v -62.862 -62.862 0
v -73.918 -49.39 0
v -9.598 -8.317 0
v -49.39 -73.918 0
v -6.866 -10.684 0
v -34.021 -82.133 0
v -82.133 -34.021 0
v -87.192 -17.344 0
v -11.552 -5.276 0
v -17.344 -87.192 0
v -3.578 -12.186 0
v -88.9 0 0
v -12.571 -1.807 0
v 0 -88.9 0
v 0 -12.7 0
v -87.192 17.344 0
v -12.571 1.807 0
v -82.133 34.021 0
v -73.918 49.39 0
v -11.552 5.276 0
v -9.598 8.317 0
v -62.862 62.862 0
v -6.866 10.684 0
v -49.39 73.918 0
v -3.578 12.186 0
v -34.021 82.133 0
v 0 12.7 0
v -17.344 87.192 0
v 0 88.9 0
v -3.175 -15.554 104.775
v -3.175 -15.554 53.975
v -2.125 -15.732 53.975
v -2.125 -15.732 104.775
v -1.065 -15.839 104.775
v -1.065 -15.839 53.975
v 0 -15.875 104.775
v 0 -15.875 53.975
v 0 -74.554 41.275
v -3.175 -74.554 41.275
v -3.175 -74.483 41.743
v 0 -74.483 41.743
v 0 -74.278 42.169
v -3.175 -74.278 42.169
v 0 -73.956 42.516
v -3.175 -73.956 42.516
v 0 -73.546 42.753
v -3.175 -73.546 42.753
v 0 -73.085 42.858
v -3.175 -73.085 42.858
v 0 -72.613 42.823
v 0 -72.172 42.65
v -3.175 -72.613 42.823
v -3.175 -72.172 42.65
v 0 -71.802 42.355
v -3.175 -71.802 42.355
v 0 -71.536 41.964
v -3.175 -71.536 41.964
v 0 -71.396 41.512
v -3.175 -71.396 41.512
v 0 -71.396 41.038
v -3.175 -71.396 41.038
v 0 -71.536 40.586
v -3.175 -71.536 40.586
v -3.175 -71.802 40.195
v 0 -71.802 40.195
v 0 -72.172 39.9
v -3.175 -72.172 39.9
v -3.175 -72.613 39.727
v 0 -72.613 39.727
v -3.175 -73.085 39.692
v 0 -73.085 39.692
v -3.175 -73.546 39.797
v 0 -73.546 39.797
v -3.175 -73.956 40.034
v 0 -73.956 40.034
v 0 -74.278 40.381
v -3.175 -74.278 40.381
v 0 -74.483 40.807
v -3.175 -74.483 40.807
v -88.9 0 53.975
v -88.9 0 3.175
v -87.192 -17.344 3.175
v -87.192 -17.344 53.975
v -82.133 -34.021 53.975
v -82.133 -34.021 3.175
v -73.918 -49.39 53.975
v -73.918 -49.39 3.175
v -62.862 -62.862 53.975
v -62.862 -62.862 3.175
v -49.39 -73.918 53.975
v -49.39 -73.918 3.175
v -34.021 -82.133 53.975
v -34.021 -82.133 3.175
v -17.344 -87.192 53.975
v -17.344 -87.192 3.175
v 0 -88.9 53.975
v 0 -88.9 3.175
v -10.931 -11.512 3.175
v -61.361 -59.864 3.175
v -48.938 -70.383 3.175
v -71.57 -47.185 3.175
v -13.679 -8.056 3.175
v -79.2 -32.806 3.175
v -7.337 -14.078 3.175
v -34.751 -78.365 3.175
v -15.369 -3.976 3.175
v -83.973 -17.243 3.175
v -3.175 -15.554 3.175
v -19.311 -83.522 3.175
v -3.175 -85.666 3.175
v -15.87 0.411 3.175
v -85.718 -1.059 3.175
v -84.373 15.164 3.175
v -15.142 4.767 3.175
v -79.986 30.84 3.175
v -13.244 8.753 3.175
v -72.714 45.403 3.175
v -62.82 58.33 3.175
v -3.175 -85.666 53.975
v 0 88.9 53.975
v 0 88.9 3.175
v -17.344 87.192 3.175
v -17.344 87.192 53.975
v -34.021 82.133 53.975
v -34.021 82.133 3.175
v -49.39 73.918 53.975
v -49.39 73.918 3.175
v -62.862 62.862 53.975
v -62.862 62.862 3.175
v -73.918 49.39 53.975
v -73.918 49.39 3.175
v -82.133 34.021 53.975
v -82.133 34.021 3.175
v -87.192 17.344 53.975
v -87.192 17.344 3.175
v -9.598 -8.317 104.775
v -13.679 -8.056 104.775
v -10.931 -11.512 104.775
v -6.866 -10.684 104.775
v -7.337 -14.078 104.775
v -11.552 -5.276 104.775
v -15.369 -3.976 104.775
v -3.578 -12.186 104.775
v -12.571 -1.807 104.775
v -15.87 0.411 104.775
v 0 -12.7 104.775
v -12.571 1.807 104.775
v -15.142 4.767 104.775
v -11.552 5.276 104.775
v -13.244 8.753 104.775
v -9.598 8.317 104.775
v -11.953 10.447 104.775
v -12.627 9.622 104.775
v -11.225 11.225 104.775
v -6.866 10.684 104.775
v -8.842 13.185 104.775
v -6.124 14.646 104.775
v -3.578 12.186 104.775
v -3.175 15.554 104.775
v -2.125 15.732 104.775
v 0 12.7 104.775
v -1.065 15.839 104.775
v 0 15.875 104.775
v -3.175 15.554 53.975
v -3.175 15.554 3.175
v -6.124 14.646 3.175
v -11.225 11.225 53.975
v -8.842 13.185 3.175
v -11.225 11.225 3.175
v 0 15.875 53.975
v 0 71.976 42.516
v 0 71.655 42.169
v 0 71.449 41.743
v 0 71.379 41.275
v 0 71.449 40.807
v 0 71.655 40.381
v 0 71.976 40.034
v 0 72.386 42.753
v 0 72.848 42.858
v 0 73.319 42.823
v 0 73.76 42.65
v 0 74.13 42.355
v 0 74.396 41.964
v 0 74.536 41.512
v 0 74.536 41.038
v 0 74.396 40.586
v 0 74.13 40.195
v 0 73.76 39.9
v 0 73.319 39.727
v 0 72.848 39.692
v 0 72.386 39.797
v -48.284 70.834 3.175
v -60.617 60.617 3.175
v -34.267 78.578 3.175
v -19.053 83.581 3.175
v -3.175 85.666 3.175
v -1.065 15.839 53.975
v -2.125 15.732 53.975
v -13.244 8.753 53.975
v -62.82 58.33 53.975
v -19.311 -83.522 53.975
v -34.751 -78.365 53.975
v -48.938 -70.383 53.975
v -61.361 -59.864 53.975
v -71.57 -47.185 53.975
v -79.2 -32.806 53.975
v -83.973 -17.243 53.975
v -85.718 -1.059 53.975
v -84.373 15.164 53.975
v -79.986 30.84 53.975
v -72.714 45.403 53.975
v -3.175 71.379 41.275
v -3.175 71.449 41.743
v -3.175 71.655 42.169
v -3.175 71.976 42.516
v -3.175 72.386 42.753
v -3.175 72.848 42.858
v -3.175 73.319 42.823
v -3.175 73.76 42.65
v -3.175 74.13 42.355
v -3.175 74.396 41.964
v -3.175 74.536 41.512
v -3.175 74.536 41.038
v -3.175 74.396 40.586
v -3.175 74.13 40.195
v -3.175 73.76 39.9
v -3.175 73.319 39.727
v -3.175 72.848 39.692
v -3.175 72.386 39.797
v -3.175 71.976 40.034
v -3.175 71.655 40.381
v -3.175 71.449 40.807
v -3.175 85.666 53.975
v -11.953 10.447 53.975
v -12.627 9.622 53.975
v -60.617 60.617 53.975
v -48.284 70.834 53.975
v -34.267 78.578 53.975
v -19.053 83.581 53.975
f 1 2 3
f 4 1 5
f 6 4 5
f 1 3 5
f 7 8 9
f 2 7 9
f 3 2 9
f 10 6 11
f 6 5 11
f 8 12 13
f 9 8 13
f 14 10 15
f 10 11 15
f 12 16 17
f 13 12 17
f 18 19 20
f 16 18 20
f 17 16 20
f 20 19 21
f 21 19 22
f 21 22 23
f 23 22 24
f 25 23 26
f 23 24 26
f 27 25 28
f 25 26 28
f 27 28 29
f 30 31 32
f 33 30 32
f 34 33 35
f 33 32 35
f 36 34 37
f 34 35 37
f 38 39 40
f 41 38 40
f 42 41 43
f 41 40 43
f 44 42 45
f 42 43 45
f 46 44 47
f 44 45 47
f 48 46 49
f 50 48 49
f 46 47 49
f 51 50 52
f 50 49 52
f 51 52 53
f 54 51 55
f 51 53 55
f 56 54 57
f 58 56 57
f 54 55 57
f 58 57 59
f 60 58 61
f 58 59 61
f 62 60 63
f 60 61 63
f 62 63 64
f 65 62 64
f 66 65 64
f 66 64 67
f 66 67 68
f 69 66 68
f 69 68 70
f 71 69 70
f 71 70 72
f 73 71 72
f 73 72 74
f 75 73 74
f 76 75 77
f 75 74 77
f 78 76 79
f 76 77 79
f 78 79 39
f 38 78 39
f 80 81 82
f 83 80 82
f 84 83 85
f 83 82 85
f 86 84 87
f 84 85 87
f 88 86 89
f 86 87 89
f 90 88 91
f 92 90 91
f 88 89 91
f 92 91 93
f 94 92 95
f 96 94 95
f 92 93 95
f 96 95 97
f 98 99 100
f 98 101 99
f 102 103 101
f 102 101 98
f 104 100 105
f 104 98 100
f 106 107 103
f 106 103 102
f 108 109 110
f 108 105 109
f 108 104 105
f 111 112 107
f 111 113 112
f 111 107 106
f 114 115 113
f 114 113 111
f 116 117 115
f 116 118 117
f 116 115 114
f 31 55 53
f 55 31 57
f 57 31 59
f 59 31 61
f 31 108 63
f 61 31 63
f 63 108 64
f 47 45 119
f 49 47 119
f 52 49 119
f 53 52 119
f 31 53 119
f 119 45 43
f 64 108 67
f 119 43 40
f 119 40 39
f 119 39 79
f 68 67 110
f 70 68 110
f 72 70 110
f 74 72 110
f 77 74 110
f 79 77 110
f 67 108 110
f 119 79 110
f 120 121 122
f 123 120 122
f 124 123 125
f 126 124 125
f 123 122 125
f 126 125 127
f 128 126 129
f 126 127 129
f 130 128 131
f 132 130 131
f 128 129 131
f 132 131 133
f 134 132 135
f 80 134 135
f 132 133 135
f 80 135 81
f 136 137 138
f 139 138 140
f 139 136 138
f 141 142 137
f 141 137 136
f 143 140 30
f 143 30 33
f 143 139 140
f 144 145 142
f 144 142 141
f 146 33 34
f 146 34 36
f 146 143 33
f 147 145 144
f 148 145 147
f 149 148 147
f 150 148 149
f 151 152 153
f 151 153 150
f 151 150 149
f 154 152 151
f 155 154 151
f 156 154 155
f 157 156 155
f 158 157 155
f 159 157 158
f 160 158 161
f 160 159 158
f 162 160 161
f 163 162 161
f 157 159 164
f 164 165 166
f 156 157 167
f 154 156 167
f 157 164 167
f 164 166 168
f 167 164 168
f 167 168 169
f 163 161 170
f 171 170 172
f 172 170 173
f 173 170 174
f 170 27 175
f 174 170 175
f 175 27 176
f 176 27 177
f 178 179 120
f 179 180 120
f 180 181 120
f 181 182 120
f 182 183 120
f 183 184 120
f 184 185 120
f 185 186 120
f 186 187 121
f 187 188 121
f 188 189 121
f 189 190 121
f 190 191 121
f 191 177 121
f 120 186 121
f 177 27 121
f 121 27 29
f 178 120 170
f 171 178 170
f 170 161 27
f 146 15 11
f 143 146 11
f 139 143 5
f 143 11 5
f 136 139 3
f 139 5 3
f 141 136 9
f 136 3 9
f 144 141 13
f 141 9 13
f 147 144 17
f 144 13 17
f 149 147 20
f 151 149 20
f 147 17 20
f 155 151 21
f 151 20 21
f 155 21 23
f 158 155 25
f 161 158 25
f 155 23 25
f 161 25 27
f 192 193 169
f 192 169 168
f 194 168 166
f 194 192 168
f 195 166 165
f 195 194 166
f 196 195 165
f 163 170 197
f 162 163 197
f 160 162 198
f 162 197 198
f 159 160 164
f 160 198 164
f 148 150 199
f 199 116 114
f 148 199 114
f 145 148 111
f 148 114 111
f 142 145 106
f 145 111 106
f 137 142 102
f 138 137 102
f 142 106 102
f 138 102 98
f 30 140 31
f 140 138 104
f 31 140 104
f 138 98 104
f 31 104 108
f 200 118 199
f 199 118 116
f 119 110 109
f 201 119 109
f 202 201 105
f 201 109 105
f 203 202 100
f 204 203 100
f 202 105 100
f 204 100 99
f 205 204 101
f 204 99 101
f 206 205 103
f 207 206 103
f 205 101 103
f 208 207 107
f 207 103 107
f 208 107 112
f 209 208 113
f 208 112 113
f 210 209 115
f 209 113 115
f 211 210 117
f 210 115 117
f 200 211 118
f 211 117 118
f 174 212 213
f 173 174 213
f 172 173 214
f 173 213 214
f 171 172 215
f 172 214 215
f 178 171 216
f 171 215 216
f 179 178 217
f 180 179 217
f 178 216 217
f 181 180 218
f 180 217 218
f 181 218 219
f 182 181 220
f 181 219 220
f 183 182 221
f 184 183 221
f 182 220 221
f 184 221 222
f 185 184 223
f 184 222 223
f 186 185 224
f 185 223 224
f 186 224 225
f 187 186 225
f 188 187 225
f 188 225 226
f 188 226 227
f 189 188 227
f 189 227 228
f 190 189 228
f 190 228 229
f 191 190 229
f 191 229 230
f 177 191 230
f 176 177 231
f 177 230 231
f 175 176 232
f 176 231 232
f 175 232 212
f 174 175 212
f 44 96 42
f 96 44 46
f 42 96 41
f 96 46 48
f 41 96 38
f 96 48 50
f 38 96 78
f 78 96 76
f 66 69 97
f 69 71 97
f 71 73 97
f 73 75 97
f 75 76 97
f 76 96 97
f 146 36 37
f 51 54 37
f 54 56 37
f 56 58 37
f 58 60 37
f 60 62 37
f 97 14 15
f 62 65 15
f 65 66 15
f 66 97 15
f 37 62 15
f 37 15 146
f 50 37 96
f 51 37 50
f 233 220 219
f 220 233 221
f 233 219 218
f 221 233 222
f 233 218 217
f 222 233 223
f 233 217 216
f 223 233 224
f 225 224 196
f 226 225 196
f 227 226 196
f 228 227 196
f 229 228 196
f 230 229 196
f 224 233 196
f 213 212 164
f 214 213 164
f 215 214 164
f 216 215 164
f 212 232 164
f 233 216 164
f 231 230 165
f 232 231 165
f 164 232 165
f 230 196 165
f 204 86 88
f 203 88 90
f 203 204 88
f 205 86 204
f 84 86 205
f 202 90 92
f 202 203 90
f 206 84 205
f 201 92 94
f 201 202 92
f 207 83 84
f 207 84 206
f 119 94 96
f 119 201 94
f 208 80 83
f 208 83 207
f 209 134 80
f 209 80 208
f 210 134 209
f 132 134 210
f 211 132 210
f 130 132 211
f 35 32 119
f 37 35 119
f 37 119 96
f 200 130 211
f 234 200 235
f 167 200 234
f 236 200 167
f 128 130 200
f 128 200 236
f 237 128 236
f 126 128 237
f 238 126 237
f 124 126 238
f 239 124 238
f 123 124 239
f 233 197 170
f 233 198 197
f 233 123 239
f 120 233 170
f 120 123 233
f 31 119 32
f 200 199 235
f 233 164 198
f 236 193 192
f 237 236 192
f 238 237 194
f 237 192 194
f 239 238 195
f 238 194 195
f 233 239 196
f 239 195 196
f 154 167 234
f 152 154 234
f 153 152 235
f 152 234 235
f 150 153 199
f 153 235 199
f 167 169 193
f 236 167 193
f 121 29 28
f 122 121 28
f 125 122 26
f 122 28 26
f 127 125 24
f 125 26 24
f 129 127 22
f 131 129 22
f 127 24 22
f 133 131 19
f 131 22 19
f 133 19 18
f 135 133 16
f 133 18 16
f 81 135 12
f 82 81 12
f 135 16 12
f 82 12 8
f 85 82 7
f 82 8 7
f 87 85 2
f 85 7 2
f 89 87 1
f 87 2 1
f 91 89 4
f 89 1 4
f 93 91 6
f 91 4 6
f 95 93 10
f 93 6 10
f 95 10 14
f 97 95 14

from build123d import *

# Parameters (mm, degrees)
F1_DEPTH = 3.175
F3_DEPTH = 50.8
F5_DEPTH = 50.8
F6_R     = 1.5875
F7_DEPTH = 3.175


with BuildPart() as f1:
    # F0 (on Top) → F1 (new body)
    with BuildSketch(Plane.XY):
        with BuildLine():
            Line((0, 12.7), (0, 88.9))
            ThreePointArc((0, 88.9), (-88.9, 0), (0, -88.9))
            Line((0, -88.9), (0, -12.7))
            ThreePointArc((0, -12.7), (-12.7, 0), (0, 12.7))
        make_face()
    extrude(amount=F1_DEPTH)

    # F2 (on face) → F3 (join)
    with BuildSketch(Plane.XY.offset(3.175)):
        with BuildLine():
            ThreePointArc((0, -12.7), (-12.7, 0), (0, 12.7))
            Line((0, 12.7), (0, 88.9))
            ThreePointArc((0, 88.9), (-62.861793, 62.861793), (-88.9, 0))
            ThreePointArc((-88.9, 0), (-62.861793, -62.861793), (0, -88.9))
            Line((0, -88.9), (0, -12.7))
        make_face()
        with BuildLine():
            ThreePointArc((-13.243587, 8.753459), (-14.666588, -6.075099), (-3.175, -15.55426))
            Line((-3.175, -15.55426), (-3.175, -85.666184))
            ThreePointArc((-3.175, -85.666184), (-79.199573, -32.805537), (-62.820203, 58.330075))
            Line((-62.820203, 58.330075), (-13.243587, 8.753459))
        make_face(mode=Mode.SUBTRACT)
        with BuildLine():
            Line((-3.175, 85.666184), (-3.175, 15.55426))
            ThreePointArc((-3.175, 15.55426), (-7.51846, 13.981716), (-11.22532, 11.22532))
            Line((-11.22532, 11.22532), (-60.616729, 60.616729))
            ThreePointArc((-60.616729, 60.616729), (-34.26682, 78.578373), (-3.175, 85.666184))
        make_face(mode=Mode.SUBTRACT)
    extrude(amount=F3_DEPTH)

    # F4 (on face) → F5 (join)
    with BuildSketch(Plane.XY.offset(53.975)):
        with BuildLine():
            ThreePointArc((0, -12.7), (-12.7, 0), (0, 12.7))
            Line((0, 12.7), (0, 15.875))
            ThreePointArc((0, 15.875), (-1.59558, 15.794611), (-3.175, 15.55426))
            ThreePointArc((-3.175, 15.55426), (-7.51846, 13.981716), (-11.22532, 11.22532))
            ThreePointArc((-11.22532, 11.22532), (-12.296722, 10.040232), (-13.243587, 8.753459))
            ThreePointArc((-13.243587, 8.753459), (-14.666588, -6.075099), (-3.175, -15.55426))
            ThreePointArc((-3.175, -15.55426), (-1.59558, -15.794611), (0, -15.875))
            Line((0, -15.875), (0, -12.7))
        make_face()
    extrude(amount=F5_DEPTH)

    # F6 (on face) → F7 (cut)
    with BuildSketch(Plane(origin=(-3.175, 0, 0), x_dir=(0, -1, 0), z_dir=(-1, 0, 0))):
        with Locations((72.966184, 41.275)):
            Circle(F6_R)
        with Locations((-72.966184, 41.275)):
            Circle(F6_R)
    extrude(amount=-F7_DEPTH, mode=Mode.SUBTRACT)


solid = f1.part
